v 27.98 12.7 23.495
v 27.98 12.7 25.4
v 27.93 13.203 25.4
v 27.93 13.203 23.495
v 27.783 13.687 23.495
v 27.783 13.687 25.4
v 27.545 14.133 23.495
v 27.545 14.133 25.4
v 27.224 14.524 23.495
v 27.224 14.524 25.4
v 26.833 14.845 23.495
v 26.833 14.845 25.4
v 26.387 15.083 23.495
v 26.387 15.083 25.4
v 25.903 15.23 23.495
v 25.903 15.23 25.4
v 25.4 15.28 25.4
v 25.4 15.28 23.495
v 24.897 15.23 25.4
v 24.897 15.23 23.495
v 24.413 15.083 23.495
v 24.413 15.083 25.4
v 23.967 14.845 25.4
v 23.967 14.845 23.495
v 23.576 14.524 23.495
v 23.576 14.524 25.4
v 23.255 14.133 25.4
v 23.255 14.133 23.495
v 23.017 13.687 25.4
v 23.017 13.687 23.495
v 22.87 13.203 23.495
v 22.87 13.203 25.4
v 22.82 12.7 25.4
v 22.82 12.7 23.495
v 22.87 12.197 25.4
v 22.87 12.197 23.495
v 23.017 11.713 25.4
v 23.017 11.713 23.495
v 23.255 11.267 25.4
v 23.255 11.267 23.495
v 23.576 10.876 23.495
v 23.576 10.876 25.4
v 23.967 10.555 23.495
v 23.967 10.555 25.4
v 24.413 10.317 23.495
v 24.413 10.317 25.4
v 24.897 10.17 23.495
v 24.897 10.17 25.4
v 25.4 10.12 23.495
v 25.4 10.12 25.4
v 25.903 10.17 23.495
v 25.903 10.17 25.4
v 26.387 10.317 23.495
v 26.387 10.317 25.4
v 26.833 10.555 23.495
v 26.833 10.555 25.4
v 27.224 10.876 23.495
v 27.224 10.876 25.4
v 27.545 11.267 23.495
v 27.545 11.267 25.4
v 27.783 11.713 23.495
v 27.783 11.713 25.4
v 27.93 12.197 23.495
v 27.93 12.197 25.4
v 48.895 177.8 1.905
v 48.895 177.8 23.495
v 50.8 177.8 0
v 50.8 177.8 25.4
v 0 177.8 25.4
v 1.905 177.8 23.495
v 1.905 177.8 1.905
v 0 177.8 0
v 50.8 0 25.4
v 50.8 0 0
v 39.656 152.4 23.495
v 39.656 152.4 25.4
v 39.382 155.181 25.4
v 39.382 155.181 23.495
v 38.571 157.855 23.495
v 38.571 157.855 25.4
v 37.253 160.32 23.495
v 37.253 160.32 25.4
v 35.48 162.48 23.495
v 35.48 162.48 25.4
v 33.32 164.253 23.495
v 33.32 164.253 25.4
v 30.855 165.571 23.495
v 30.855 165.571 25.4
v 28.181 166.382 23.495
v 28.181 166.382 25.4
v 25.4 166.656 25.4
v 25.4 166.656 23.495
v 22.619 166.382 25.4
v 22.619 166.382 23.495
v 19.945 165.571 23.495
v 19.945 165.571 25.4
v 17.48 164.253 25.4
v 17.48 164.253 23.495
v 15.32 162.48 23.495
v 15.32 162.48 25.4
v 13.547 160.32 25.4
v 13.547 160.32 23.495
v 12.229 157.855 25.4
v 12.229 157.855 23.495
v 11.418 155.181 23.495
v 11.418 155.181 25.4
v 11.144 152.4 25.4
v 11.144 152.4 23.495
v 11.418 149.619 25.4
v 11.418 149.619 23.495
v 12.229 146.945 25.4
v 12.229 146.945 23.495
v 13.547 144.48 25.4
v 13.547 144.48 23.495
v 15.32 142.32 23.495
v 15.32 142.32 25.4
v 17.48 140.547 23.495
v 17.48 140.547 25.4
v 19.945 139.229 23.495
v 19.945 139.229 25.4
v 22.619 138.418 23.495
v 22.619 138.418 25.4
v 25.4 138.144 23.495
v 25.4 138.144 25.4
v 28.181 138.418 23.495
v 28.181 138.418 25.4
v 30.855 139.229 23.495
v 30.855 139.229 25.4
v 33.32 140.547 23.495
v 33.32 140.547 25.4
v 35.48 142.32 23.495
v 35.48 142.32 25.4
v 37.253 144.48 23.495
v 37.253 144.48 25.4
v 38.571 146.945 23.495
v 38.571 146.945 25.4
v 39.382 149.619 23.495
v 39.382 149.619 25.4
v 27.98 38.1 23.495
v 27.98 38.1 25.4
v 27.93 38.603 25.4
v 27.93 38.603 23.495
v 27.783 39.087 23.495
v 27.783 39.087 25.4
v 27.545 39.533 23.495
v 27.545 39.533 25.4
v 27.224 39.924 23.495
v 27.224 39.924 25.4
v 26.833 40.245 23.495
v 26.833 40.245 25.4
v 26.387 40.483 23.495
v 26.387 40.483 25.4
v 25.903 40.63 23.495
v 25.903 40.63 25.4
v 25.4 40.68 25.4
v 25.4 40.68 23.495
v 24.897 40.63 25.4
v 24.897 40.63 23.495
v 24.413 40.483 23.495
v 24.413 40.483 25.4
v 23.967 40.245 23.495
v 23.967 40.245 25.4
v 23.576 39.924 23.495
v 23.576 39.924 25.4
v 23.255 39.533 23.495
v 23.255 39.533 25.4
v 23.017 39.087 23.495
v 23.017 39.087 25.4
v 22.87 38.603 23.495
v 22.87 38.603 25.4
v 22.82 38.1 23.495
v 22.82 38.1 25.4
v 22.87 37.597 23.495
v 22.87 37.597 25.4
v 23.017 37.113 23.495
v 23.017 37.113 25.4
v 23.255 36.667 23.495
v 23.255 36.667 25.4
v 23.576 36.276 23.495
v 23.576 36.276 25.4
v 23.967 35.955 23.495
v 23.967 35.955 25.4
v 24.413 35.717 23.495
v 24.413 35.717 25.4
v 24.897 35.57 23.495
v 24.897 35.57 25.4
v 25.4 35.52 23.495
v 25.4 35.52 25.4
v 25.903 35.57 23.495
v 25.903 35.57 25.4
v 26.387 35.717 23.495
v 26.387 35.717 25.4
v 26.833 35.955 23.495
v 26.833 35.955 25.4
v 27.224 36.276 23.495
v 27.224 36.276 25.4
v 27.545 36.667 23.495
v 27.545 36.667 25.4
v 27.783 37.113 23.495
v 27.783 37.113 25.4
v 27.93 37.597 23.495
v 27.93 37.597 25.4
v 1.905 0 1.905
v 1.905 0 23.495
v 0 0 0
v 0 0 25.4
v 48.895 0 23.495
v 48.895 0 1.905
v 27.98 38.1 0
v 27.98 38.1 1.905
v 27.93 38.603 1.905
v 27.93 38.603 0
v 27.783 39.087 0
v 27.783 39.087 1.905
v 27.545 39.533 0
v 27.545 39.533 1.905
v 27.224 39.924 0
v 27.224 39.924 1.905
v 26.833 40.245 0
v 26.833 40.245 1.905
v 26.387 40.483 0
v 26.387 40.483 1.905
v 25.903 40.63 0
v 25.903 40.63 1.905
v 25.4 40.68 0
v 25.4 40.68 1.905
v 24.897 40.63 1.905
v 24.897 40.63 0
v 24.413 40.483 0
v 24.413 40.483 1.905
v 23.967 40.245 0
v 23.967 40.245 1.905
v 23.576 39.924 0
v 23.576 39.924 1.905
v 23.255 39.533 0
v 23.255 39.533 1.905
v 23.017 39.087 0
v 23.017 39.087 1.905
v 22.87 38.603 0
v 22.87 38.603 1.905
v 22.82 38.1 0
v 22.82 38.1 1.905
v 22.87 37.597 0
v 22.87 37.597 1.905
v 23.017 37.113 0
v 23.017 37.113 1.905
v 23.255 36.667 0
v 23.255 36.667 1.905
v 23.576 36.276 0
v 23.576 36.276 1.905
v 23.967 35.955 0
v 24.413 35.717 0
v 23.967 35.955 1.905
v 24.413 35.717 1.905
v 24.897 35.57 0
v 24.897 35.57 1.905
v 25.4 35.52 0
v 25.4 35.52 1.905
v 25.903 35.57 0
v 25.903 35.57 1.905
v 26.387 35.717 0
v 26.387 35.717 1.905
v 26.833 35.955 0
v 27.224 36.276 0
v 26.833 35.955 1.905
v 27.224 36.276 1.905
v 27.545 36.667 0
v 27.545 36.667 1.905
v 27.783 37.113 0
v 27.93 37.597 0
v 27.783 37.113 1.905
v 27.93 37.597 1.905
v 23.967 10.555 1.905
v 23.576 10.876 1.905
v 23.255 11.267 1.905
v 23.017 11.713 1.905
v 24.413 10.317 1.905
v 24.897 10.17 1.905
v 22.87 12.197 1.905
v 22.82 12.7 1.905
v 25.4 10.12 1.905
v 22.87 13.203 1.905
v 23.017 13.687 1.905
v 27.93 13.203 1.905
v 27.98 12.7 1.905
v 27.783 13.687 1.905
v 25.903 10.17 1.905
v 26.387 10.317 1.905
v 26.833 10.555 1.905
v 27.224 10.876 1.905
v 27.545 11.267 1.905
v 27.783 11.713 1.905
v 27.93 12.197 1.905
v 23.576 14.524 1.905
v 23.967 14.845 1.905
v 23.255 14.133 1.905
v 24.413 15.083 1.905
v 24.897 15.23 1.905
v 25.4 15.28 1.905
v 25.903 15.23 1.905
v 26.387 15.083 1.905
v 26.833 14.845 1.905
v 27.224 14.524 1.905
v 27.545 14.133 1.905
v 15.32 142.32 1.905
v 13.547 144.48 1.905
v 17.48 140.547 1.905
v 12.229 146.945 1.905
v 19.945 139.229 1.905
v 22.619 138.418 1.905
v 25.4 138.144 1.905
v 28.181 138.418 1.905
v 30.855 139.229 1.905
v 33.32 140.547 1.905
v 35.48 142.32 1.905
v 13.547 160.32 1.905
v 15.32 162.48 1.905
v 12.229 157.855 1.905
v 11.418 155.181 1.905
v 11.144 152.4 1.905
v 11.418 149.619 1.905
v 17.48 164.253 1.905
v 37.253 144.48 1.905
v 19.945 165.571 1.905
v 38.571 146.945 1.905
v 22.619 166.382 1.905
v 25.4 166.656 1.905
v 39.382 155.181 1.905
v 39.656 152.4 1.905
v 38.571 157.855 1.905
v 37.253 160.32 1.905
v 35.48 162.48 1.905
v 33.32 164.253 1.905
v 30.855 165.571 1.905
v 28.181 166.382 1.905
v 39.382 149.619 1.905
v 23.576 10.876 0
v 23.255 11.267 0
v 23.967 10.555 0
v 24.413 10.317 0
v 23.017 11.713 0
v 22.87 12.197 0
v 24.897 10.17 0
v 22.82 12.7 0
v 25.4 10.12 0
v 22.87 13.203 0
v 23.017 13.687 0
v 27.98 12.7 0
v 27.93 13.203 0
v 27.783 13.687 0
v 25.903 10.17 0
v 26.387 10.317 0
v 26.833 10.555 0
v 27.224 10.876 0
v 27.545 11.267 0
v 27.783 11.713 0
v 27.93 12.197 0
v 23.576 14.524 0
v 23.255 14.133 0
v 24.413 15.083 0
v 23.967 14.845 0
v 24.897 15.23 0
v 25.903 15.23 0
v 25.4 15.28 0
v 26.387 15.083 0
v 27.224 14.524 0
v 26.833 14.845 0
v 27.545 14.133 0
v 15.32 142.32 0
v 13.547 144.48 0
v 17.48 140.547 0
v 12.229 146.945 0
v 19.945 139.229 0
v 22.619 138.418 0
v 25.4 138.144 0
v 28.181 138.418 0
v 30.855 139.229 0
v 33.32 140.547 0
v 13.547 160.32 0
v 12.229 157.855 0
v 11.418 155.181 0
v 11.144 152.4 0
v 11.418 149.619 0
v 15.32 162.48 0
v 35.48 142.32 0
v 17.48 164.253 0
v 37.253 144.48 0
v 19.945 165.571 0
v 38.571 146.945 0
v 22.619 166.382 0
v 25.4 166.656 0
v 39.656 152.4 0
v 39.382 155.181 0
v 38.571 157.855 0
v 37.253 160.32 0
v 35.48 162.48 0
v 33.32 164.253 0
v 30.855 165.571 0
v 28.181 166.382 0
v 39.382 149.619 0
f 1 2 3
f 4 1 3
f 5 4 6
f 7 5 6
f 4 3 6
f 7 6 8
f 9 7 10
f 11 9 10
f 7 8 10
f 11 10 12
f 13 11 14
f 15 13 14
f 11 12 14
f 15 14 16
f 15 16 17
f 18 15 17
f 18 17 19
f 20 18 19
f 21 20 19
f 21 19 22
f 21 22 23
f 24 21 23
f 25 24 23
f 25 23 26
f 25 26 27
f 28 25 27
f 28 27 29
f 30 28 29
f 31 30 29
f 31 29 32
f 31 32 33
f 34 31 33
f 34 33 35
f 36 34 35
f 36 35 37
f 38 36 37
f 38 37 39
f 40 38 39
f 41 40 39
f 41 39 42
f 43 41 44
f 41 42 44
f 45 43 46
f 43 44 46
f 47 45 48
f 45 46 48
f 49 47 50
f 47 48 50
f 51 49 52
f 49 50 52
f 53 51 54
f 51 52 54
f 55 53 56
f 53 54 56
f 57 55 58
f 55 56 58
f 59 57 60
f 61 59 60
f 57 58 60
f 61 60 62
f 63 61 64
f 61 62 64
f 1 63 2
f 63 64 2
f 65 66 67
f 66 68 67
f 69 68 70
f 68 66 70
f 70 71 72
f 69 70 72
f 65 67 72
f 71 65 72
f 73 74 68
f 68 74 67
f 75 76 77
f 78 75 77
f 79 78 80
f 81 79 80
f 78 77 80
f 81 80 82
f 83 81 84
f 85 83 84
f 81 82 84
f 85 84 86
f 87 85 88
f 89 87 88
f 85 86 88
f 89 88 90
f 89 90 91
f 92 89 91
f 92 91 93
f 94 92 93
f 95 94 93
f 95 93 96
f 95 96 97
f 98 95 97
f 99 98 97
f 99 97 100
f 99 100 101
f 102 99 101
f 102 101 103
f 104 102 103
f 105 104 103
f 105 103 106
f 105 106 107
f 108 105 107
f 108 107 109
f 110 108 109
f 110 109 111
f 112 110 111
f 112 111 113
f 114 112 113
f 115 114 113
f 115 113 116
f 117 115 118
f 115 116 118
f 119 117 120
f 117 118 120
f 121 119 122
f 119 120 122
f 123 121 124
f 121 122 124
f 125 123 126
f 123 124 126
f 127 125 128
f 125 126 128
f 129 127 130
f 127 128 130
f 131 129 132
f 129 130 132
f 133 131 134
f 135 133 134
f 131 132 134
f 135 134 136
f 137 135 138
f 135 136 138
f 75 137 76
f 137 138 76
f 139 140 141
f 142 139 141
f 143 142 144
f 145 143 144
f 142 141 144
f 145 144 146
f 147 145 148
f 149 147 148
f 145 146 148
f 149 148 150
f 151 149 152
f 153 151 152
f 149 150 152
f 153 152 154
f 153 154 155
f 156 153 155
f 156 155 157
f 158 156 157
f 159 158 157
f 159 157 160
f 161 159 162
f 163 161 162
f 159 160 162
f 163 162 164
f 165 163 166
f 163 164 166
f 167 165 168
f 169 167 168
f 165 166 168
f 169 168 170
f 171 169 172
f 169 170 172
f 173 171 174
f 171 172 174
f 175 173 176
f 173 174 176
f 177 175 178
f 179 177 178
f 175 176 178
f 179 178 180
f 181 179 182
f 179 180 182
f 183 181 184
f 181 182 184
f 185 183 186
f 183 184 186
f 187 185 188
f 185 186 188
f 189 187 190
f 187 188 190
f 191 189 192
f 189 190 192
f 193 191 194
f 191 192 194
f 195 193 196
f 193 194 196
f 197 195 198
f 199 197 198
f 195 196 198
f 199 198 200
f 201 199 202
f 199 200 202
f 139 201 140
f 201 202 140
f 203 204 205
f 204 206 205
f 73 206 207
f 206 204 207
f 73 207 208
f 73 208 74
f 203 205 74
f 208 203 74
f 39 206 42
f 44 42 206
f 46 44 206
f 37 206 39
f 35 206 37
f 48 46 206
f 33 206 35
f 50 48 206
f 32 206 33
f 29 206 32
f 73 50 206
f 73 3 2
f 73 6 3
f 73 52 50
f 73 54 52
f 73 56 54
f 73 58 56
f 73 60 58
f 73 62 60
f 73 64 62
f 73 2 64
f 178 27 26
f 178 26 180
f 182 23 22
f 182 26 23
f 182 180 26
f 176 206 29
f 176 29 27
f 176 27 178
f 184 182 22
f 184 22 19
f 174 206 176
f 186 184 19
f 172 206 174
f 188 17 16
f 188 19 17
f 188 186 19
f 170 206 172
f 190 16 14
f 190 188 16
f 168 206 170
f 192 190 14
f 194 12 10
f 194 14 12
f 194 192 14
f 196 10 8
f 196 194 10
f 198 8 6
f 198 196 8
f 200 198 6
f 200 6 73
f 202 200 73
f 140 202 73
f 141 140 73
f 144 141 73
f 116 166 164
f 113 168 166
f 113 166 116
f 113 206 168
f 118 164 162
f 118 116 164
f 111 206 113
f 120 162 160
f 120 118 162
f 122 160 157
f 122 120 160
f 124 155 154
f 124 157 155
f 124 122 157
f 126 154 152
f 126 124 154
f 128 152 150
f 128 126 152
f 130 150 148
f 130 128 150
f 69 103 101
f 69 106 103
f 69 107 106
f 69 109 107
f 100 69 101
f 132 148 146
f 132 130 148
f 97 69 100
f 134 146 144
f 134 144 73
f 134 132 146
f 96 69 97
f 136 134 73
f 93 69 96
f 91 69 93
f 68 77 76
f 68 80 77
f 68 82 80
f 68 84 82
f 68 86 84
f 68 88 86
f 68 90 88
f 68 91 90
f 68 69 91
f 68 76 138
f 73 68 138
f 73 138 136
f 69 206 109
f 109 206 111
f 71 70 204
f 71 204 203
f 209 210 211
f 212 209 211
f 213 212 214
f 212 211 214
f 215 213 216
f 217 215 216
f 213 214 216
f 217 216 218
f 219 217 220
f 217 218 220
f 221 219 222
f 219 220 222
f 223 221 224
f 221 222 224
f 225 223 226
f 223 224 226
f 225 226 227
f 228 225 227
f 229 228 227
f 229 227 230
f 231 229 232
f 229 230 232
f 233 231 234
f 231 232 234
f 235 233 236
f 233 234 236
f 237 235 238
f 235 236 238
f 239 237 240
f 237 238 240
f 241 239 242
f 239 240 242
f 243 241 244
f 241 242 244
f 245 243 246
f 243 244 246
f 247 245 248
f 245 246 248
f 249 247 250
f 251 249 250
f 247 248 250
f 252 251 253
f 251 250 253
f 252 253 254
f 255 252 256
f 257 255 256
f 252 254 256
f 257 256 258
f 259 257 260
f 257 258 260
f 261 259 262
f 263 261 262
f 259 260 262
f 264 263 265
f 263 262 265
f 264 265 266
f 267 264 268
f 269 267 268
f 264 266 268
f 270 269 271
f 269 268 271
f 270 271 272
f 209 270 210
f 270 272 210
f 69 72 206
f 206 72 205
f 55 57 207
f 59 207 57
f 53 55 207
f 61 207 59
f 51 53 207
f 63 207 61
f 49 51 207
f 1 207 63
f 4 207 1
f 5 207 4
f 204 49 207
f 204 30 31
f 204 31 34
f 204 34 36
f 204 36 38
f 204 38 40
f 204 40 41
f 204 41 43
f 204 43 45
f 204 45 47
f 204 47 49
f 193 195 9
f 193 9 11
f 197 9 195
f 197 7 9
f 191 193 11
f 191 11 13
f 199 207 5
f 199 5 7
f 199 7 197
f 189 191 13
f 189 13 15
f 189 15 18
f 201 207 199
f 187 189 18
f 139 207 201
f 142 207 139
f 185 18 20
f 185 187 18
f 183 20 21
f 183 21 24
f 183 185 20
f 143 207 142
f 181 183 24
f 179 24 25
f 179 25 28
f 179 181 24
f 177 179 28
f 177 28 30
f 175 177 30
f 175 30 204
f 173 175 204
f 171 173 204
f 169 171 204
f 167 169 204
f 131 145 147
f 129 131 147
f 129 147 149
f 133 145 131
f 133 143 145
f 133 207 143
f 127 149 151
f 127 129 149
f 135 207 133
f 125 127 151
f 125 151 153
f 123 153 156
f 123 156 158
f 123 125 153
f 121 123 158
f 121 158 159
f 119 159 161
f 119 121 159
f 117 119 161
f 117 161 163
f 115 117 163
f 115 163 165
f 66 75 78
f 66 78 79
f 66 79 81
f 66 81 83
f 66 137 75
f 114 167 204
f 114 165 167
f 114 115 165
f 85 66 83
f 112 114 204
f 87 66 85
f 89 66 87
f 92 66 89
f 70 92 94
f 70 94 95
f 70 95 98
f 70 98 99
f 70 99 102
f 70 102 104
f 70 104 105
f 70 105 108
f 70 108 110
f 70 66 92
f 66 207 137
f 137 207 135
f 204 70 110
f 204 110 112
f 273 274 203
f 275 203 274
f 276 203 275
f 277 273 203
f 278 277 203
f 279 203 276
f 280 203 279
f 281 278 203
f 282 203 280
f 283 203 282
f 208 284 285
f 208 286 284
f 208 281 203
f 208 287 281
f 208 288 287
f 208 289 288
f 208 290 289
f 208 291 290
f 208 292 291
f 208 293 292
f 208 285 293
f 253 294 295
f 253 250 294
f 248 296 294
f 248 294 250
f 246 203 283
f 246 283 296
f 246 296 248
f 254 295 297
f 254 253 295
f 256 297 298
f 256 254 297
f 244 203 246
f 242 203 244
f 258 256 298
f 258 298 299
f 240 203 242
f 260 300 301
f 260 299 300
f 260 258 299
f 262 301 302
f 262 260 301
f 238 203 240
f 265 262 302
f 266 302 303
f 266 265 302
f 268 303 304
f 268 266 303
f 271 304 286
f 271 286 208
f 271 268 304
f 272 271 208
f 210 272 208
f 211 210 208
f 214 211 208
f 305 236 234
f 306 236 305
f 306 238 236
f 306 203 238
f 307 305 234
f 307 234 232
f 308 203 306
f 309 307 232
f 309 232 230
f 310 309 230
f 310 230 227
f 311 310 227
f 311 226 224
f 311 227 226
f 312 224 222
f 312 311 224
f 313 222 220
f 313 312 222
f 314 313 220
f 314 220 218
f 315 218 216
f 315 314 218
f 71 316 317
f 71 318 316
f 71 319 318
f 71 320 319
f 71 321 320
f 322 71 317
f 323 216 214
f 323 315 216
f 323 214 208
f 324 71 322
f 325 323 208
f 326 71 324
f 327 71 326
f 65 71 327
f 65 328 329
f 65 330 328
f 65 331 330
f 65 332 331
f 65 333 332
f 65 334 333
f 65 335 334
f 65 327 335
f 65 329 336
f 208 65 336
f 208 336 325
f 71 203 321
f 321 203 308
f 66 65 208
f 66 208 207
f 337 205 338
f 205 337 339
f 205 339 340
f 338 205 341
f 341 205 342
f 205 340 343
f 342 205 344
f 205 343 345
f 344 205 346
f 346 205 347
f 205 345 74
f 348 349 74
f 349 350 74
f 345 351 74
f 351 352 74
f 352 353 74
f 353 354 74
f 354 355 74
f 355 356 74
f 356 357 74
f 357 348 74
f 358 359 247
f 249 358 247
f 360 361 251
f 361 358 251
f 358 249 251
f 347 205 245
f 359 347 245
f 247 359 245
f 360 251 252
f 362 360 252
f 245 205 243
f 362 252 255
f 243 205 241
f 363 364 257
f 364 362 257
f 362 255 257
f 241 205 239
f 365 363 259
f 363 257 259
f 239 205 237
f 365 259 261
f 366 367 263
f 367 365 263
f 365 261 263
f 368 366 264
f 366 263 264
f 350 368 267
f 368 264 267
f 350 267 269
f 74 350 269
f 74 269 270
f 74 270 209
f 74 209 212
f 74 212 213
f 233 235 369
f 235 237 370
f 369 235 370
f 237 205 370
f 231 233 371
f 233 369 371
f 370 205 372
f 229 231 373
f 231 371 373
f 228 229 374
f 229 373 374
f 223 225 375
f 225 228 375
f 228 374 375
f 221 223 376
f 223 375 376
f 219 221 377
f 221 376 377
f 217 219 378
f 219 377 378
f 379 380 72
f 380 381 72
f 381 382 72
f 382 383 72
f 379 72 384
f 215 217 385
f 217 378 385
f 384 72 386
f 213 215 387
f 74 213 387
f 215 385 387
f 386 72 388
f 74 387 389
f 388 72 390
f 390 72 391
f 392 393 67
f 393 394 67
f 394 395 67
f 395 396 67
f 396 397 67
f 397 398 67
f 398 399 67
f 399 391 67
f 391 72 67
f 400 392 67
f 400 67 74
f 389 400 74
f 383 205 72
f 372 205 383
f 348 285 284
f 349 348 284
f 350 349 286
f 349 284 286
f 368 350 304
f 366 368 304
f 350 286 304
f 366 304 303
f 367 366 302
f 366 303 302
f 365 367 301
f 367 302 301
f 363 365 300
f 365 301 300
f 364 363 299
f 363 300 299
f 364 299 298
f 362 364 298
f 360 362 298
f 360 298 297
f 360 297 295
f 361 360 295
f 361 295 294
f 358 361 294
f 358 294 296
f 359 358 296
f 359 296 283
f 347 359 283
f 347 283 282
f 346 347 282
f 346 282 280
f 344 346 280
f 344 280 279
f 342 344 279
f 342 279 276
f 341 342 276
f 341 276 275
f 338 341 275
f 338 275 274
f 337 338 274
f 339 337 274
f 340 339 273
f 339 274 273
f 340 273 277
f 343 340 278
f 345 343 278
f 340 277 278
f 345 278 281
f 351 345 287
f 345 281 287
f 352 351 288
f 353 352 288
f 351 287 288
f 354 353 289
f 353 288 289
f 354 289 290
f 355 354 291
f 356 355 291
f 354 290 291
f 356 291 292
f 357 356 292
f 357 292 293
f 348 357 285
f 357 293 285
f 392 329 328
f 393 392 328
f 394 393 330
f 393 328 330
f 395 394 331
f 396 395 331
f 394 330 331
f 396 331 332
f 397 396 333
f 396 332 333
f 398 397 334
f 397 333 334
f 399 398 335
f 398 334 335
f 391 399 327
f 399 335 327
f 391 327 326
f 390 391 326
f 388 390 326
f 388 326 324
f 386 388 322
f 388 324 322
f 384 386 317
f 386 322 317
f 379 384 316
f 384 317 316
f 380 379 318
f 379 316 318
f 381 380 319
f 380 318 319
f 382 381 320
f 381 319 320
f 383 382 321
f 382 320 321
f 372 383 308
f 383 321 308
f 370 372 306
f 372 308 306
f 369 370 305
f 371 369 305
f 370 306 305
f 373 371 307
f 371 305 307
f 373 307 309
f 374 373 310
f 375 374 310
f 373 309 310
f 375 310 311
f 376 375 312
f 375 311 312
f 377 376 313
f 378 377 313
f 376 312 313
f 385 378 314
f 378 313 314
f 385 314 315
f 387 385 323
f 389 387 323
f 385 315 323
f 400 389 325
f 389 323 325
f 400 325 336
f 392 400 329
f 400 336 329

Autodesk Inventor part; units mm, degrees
ref_plane "YZ Plane" through (0, 0, 0) normal (1, 0, 0) x (0, 1, 0)
ref_plane "XZ Plane" through (0, 0, 0) normal (0, 1, 0) x (-1, 0, 0)
ref_plane "XY Plane" through (0, 0, 0) normal (0, 0, 1) x (1, 0, 0)
sketch "Sketch1" plane through (0, 0, 0) normal (0, 0, 1) x (1, 0, 0)
  line L0 (0, 0) -> (50.8, 0)
  line L1 (50.8, 0) -> (50.8, 177.8)
  line L2 (50.8, 177.8) -> (0, 177.8)
  line L3 (0, 177.8) -> (0, 0)
  dimension "d0" = 50.8
  dimension "d1" = 177.8
extrude "Extrusion1" add sketch "Sketch1" along normal blind 25.4
sketch "Sketch2" plane through (0, 177.8, 0) normal (0, 1, 0) x (1, 0, 0)
  line L0 (0, 0) -> (0, -25.4) projected
  line L1 (50.8, -25.4) -> (0, -25.4) projected
  line L2 (50.8, 0) -> (50.8, -25.4) projected
  line L3 (50.8, 0) -> (0, 0) projected
  line L4 (48.895, -23.495) -> (1.905, -23.495)
  line L5 (1.905, -23.495) -> (1.905, -1.905)
  line L6 (1.905, -1.905) -> (48.895, -1.905)
  line L7 (48.895, -1.905) -> (48.895, -23.495)
  dimension "d4" = 1.905
extrude "Extrusion2" cut sketch "Sketch2" against normal blind 508 contours L4 L5 L6 L7
sketch "Sketch3" plane through (0, 0, 25.4) normal (0, 0, 1) x (1, 0, 0)
  line L0 (1.905, 0) -> (48.895, 0) construction
  line L1 (25.4, 0) -> (25.4, 12.7) construction
  line L2 (25.4, 12.7) -> (25.4, 38.1) construction
  line L3 (48.895, 177.8) -> (1.905, 177.8) construction
  line L4 (25.4, 177.8) -> (25.4, 152.4) construction
  circle A0 centre (25.4, 152.4) radius 14.2557
  circle A1 centre (25.4, 12.7) radius 2.5797
  circle A2 centre (25.4, 38.1) radius 2.5797
  point P0 (0, 0)
  dimension "d7" = 12.7
  dimension "d8" = 25.4
  dimension "d9" = 25.4
  dimension "d10" = 28.5115
  dimension "d11" = 5.1594
  dimension "d12" = 5.1594
extrude "Extrusion3" cut sketch "Sketch3" against normal blind 508
properties part number "vertical leg"
